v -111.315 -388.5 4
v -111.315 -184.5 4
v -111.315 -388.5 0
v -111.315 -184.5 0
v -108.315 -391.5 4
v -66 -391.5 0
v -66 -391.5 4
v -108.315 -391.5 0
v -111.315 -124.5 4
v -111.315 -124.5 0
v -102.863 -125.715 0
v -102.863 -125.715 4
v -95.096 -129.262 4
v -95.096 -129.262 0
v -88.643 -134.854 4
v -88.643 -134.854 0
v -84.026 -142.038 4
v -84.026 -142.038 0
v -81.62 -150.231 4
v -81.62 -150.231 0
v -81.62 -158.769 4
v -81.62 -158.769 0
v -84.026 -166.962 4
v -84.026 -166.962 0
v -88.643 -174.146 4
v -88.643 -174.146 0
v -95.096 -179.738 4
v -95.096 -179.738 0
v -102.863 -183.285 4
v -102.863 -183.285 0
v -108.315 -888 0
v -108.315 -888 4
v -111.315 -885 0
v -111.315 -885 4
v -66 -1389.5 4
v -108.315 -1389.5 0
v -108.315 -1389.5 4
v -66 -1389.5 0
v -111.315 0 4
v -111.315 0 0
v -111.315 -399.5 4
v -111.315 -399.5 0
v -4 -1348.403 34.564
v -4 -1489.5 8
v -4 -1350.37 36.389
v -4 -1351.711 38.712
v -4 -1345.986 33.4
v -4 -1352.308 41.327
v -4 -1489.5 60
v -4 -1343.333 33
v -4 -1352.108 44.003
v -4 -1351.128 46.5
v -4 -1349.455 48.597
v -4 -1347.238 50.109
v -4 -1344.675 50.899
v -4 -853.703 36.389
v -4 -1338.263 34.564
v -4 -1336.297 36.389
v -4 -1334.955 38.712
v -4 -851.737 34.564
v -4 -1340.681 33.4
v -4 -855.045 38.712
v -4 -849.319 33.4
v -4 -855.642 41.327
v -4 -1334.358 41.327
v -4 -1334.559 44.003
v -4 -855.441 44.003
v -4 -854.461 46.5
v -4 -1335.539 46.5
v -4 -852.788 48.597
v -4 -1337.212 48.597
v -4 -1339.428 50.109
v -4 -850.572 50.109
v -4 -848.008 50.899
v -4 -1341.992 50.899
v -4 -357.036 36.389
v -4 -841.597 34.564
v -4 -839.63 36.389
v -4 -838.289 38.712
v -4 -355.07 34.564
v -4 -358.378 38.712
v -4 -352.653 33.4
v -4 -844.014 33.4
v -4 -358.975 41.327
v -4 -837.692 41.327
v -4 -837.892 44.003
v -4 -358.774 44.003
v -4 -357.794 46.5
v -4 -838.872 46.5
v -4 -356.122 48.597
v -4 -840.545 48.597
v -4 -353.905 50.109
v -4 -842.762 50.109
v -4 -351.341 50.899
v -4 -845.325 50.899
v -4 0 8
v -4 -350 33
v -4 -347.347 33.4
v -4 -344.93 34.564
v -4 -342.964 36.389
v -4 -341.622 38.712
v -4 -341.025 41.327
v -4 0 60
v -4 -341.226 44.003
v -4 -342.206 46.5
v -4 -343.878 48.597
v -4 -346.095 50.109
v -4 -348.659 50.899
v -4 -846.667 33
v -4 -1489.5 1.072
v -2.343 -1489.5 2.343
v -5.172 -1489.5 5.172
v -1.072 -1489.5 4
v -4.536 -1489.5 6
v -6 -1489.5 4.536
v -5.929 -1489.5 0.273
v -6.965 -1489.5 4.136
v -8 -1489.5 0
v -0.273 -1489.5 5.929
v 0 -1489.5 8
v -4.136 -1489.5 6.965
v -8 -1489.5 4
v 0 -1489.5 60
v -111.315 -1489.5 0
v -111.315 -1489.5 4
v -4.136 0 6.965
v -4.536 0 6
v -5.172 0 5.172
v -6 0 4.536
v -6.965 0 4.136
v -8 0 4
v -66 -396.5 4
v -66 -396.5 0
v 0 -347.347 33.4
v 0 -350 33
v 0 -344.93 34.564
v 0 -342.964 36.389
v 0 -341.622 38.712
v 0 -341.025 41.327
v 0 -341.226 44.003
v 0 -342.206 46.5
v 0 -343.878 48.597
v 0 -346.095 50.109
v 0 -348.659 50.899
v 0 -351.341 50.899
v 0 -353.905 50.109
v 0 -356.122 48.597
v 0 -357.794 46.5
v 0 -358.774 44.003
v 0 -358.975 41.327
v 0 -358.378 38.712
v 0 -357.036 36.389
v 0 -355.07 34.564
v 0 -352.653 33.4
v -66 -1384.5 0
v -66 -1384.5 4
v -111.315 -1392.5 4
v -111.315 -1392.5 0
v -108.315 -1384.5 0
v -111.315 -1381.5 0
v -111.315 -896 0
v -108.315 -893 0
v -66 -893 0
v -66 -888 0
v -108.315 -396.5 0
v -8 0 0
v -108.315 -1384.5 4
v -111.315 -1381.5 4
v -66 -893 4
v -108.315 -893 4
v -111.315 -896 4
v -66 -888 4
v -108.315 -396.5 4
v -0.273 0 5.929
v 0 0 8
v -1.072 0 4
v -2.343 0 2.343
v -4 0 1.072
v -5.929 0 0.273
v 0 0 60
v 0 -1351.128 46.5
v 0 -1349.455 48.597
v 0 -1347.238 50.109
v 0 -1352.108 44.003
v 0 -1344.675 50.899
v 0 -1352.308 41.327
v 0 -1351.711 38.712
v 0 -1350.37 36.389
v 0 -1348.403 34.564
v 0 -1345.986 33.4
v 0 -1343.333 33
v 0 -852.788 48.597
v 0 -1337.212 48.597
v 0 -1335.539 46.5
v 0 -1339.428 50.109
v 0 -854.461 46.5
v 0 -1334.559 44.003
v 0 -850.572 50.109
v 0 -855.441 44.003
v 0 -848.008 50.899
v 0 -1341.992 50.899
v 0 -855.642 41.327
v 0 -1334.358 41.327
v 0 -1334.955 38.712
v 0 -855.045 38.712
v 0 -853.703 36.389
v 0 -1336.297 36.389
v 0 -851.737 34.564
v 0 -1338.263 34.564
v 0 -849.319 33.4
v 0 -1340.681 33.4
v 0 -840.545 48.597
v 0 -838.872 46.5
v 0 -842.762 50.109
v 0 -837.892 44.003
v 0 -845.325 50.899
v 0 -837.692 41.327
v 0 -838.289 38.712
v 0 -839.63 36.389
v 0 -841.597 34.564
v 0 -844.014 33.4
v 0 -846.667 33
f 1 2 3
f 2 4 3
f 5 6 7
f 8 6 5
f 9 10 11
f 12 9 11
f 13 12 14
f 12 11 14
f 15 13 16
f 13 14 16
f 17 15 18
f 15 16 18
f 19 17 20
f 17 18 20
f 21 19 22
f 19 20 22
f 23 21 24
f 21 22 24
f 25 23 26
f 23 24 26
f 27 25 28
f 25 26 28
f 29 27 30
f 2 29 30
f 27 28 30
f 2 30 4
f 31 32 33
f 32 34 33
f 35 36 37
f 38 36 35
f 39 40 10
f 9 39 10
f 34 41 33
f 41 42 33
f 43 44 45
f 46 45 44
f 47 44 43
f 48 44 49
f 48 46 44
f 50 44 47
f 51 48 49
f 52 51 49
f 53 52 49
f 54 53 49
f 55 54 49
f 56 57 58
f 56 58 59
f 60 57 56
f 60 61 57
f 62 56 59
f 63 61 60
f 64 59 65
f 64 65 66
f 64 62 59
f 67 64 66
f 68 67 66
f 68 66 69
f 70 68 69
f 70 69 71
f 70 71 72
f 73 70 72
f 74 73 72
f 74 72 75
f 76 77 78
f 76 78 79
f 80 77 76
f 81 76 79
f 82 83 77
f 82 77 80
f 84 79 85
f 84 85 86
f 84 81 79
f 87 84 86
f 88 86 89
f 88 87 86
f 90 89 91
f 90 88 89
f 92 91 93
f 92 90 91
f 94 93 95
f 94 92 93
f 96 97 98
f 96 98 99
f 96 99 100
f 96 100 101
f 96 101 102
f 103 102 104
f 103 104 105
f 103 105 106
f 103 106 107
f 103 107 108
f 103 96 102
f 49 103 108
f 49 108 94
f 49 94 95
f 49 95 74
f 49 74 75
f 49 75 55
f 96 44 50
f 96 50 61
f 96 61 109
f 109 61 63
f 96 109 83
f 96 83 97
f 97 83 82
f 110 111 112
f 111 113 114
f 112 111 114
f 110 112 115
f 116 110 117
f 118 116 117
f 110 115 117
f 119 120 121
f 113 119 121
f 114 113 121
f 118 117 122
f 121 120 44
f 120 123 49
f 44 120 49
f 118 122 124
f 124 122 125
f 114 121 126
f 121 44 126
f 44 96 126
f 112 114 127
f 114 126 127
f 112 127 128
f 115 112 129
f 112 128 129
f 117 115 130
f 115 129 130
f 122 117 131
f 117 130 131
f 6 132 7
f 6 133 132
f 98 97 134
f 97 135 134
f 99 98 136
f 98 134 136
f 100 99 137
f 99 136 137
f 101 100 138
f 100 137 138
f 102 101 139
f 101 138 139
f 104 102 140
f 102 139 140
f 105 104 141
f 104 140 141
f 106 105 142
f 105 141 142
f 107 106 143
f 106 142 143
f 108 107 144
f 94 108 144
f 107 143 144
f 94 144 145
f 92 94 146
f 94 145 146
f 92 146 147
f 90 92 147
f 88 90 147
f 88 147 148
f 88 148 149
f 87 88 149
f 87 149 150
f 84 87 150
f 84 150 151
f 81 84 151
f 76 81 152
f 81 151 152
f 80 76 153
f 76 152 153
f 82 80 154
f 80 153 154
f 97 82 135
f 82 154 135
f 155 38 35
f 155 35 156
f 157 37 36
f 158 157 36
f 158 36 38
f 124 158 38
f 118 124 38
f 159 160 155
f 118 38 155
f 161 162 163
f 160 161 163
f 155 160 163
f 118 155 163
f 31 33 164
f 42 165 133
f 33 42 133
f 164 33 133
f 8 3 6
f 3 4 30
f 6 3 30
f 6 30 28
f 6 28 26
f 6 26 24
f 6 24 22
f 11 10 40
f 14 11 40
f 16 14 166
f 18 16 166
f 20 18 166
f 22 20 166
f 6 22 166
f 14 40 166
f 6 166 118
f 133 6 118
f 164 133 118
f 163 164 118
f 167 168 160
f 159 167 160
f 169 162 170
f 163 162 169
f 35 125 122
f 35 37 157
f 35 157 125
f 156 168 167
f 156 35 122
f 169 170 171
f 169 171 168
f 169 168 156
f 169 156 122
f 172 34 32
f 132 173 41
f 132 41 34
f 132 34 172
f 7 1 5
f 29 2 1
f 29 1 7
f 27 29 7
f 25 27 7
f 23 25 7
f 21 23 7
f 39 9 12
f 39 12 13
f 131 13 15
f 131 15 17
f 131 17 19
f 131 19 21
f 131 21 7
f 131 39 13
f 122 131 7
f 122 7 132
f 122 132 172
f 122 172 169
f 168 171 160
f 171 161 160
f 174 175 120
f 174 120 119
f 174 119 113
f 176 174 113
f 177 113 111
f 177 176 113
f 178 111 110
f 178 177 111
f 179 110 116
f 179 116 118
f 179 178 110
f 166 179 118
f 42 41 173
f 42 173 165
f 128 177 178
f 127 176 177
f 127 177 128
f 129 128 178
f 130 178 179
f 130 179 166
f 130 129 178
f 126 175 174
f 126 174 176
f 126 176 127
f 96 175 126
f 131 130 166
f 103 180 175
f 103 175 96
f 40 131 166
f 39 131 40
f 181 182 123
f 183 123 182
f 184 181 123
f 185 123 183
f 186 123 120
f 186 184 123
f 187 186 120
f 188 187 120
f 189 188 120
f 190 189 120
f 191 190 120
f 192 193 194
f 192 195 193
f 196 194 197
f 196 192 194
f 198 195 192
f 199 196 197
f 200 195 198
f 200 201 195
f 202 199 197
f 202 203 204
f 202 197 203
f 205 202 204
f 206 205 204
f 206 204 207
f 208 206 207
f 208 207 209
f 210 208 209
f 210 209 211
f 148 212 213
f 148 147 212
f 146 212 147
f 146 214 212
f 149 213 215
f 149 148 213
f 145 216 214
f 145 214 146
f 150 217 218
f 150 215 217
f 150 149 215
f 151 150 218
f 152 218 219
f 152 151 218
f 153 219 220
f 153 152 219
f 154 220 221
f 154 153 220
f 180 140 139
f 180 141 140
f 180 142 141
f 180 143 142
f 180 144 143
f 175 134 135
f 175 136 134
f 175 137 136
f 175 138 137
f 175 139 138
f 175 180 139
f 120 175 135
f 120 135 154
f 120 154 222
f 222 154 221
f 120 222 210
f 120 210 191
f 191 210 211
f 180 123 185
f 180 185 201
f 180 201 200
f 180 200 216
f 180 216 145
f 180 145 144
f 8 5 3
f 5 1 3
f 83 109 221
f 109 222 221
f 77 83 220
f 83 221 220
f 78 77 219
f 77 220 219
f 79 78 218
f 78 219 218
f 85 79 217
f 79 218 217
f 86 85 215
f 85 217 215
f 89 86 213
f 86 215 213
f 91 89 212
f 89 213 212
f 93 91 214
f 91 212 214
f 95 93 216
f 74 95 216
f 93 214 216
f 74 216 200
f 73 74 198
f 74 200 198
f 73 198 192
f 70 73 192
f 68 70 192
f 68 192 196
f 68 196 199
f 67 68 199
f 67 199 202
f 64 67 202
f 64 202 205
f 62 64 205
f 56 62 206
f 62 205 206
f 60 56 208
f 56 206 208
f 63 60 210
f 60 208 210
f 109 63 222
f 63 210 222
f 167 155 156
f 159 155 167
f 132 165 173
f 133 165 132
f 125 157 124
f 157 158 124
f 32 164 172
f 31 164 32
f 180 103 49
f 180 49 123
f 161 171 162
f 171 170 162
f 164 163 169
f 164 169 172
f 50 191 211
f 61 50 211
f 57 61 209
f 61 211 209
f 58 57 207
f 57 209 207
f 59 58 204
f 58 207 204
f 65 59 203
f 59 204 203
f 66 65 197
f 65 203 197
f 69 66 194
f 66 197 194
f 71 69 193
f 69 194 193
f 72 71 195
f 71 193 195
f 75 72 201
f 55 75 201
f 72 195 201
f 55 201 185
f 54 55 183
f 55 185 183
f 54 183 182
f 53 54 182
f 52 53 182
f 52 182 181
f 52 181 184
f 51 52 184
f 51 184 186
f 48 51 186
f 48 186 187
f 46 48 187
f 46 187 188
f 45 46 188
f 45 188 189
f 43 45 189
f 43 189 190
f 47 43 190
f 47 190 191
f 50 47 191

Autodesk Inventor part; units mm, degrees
ref_plane "YZ Plane" through (0, 0, 0) normal (1, 0, 0) x (0, 1, 0)
ref_plane "XZ Plane" through (0, 0, 0) normal (0, 1, 0) x (-1, 0, 0)
ref_plane "XY Plane" through (0, 0, 0) normal (0, 0, 1) x (1, 0, 0)
sketch "Sketch1" plane through (0, 0, 0) normal (0, 0, 1) x (1, 0, 0)
  line L0 (0, 0) -> (-111.3151, 0)
  line L1 (-111.3151, 0) -> (-111.3151, -1489.5)
  line L2 (-111.3151, -1489.5) -> (0, -1489.5)
  line L3 (0, -1489.5) -> (0, 0)
  line L4 (-111.3151, -1389.5) -> (-66, -1389.5)
  line L5 (-66, -1389.5) -> (-66, -1384.5)
  line L6 (-66, -1384.5) -> (-111.3151, -1384.5)
  line L7 (-111.3151, -1384.5) -> (-111.3151, -1389.5)
  line L8 (-111.3151, -893) -> (-66, -893)
  line L9 (-66, -893) -> (-66, -888)
  line L10 (-66, -888) -> (-111.3151, -888)
  line L11 (-111.3151, -888) -> (-111.3151, -893)
  line L12 (-111.3151, -396.5) -> (-66, -396.5)
  line L13 (-66, -396.5) -> (-66, -391.5)
  line L14 (-66, -391.5) -> (-111.3151, -391.5)
  line L15 (-111.3151, -391.5) -> (-111.3151, -396.5)
  circle A0 centre (-111.3151, -154.5) radius 30
  point P0 (-111.3151, -391.5)
  point P1 (-111.3151, -1384.5)
  point P2 (-111.3151, -124.5)
  point P3 (-111.3151, -184.5)
  dimension "d0" = 1489.5
  dimension "d1" = 111.3151
  dimension "d2" = 5
  dimension "d4" = 100
  dimension "d7" = 496.5
  dimension "d23" = 66
  dimension "d28" = 60
  dimension "d29" = 1335
extrude "Plate1" add sketch "Sketch1" along normal blind 4 contours L3 L2 L1 L4 L5 L6 L8 L9 L10 L12 L13 L14 A0 L0
sketch "Sketch2" plane through (-4, 0, 0) normal (1, 0, 0) x (0, 1, 0)
  line L0 (-1489.5, 0) -> (0, 0)
  line L1 (0, 0) -> (0, 60)
  line L2 (0, 60) -> (-1489.5, 60)
  line L3 (-1489.5, 60) -> (-1489.5, 0)
edge flange "Flange1" height 60 angle 90 thickness 4 bend radius 4 thickness toward (1, 0, 0) relief tear relief width 4 relief depth 2 edges at (0, -744.75, 4) wall of the first edge with corners at (-4, -1489.5, 0) (-4, 0, 0) (-4, 0, 60) (-4, -1489.5, 60)
bend "Bend1"
corner "Corner1"
chamfer "Corner Chamfer1" distance 3 angle 45 6 edges at (-111.3151, -1389.5, 2) (-111.3151, -1384.5, 2) (-111.3151, -893, 2) (-111.3151, -888, 2) (-111.3151, -391.5, 2) (-111.3151, -396.5, 2)
sketch "Sketch4" plane through (0, -1489.5, 60) normal (1, 0, 0) x (0, 0, -1)
  circle A0 centre (18, 1139.5) radius 9
  line L0 (0, 0) -> (0, 1489.5) projected
  circle A1 centre (18, 642.8333) radius 9
  circle A2 centre (18, 146.1667) radius 9
  point P0 (60, 1489.5)
  dimension "d30" = 18
  dimension "d31" = 18
  dimension "d32" = 350
  dimension "d35" = 496.6667
extrude "Cut1" cut sketch "Sketch4" against normal blind 4
equation "\"d0\" = Стрингер_длина"
equation "\"d1\" = стрингер_глубина_8"
equation "\"d2\" = паз_под_стрингер_толщина"
equation "\"d7\" = 0.333333 * Стрингер_длина"
equation "\"d23\" = паз_под_стрингер_глубина - Thickness"
equation "\"d28\" = 2 * радиус_выреза_под_сварку"
equation "\"d35\" = Шаг_шпангоутов"
equation "\"d40\" = Thickness"
equation "\"d12\" = Thickness"
equation "\"d13\" = BendReliefWidth"
equation "\"d14\" = BendReliefDepth"
equation "\"d15\" = MinimumRemnant"
equation "\"d16\" = TransitionRadius"
equation "\"d17\" = ребро_усилителей"
equation "\"d19\" = BendRadius"
equation "\"d20\" = CornerReliefSize"
equation "\"d21\" = GapSize"
equation "\"d22\" = JacobiRadiusSize"
equation "\"BendRadius\" = Thickness"
equation "\"BendReliefWidth\" = Thickness"
equation "\"BendReliefDepth\" = 0.5 * Thickness"
equation "\"CornerReliefSize\" = 4 * Thickness"
equation "\"MinimumRemnant\" = 2 * Thickness"
equation "\"TransitionRadius\" = BendRadius"
equation "\"JacobiRadiusSize\" = BendRadius"
equation "\"GapSize\" = Thickness"
equation "\"Стрингер_длина\" = 1489.5"
equation "\"стрингер_глубина_8\" = 111.315065"
equation "\"паз_под_стрингер_толщина\" = 5"
equation "\"паз_под_стрингер_глубина\" = 70"
equation "\"Thickness\" = 4"
equation "\"радиус_выреза_под_сварку\" = 30"
equation "\"Шаг_шпангоутов\" = 496.666667"
equation "\"ребро_усилителей\" = 60"
properties part number "GBK 0303 stringer 8" material "Steel"
